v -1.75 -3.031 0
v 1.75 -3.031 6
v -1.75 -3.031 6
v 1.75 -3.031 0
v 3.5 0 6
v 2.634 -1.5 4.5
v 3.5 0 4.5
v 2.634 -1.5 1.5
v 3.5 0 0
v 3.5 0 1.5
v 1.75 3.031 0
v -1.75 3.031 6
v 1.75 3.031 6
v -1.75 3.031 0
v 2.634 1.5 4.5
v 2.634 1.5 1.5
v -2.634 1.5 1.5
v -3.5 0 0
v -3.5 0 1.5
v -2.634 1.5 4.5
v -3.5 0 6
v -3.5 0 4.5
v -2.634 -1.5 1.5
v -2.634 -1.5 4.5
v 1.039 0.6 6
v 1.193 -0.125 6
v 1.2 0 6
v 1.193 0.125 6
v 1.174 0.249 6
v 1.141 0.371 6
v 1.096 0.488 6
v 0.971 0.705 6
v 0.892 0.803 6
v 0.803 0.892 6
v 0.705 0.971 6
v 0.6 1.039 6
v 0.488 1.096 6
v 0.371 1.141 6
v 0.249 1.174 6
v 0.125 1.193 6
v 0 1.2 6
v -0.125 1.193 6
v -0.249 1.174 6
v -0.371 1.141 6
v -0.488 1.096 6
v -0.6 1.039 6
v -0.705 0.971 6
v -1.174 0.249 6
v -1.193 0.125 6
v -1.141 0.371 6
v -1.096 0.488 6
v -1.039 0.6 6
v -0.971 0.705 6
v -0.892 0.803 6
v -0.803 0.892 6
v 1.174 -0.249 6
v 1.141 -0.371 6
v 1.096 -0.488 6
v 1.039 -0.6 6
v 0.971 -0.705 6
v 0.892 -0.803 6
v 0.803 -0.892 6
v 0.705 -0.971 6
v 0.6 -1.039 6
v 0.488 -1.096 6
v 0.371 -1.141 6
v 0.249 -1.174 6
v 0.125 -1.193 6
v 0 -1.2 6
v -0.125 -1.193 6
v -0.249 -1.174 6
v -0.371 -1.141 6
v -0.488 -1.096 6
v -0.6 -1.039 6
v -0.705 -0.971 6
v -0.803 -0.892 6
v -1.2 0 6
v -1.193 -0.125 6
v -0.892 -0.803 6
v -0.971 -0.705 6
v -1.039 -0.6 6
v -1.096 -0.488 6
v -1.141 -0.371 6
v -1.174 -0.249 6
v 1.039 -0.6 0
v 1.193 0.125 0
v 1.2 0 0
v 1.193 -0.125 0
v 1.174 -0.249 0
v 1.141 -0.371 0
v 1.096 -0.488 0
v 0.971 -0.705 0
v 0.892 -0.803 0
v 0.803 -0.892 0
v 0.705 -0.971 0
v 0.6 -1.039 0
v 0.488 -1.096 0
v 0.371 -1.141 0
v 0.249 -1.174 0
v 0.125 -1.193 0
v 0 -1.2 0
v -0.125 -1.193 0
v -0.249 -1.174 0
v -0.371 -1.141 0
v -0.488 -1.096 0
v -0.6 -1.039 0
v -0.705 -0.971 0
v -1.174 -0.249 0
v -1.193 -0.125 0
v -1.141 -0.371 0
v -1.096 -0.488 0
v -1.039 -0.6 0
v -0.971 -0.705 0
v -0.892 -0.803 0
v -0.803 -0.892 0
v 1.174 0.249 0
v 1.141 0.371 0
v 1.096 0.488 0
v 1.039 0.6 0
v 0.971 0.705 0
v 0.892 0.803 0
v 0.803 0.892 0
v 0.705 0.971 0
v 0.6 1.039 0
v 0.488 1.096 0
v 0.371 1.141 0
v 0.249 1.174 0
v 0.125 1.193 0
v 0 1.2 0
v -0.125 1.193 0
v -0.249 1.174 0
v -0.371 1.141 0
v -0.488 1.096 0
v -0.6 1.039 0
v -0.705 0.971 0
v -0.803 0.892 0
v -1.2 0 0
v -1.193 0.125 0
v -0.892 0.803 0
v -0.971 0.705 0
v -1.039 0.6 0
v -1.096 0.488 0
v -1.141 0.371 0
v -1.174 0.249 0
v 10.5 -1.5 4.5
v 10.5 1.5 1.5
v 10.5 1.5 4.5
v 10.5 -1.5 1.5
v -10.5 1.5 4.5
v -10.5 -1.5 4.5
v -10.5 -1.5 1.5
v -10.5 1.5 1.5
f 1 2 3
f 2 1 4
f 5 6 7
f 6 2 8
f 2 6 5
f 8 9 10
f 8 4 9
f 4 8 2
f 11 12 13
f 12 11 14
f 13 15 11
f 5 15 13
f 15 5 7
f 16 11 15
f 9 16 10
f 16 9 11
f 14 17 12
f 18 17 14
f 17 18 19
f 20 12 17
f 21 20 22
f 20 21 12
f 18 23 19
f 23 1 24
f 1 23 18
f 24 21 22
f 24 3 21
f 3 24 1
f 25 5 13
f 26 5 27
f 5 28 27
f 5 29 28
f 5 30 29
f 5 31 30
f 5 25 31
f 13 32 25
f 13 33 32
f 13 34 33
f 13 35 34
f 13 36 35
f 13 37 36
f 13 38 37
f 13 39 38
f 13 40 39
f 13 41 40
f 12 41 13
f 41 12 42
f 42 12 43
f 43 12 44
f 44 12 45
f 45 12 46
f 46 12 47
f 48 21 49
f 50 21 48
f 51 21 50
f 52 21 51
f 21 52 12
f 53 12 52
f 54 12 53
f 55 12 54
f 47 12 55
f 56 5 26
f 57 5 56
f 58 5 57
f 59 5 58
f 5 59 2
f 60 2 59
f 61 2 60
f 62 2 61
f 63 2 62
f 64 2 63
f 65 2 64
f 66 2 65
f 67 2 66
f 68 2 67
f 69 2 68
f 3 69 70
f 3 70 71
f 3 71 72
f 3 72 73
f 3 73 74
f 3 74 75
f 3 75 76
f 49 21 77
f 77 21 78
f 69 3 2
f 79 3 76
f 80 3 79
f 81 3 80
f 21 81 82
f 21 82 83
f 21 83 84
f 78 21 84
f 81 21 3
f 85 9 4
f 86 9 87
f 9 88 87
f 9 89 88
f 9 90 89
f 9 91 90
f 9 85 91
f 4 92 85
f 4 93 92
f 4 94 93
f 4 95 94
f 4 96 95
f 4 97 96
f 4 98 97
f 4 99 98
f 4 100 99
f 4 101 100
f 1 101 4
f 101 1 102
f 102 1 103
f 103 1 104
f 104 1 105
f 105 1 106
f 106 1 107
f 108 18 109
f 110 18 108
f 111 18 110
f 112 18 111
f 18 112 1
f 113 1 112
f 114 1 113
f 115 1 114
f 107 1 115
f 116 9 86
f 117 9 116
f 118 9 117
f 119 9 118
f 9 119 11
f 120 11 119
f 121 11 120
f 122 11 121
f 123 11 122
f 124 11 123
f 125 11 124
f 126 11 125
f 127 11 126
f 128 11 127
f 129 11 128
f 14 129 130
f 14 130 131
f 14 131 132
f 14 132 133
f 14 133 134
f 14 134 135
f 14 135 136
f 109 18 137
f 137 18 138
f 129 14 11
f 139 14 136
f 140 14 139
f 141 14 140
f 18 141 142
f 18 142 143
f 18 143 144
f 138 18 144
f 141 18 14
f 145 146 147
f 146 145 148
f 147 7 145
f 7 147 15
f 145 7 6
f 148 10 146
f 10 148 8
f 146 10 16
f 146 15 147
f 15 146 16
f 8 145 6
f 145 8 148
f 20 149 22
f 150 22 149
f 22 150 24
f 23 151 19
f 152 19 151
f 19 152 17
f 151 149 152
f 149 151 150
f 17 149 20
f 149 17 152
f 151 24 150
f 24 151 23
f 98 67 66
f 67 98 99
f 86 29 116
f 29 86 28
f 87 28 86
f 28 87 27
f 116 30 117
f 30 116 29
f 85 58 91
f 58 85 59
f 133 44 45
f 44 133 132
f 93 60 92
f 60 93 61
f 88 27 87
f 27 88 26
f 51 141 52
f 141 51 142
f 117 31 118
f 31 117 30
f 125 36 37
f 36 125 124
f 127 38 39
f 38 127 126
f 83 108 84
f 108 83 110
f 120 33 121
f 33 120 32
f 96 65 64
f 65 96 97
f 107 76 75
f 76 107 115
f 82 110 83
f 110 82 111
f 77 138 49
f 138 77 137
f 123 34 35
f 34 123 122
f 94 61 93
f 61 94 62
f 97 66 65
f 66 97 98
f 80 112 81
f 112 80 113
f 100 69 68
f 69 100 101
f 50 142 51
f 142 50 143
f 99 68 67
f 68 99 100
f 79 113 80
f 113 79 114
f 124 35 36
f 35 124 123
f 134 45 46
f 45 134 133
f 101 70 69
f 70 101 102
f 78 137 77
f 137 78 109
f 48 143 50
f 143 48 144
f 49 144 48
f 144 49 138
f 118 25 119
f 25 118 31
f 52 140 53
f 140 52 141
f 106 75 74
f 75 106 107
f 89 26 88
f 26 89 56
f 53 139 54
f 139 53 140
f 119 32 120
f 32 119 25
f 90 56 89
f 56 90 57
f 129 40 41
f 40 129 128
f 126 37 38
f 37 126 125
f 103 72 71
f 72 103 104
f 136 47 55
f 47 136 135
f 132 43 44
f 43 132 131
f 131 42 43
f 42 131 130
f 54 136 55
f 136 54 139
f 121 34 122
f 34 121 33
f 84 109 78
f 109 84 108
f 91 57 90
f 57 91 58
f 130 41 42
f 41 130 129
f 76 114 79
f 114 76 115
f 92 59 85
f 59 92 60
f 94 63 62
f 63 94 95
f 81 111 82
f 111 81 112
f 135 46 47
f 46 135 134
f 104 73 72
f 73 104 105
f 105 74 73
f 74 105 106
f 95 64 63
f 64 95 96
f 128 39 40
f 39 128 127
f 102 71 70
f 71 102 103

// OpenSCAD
// Wing nut with two reinforced wings.
$fn = 60;
eps = 0.02;
thread_d = 2.4;
body_d = 7;
body_h = 6;
wing_l = 8;
wing_t = 3;
difference() {
    union() {
        cylinder(d = body_d, h = body_h, $fn = 6);
        translate([body_d / 2 - 1, -wing_t / 2, body_h / 2 - wing_t / 2]) cube([wing_l, wing_t, wing_t]);
        translate([-body_d / 2 - wing_l + 1, -wing_t / 2, body_h / 2 - wing_t / 2]) cube([wing_l, wing_t, wing_t]);
    }
    translate([0, 0, -eps]) cylinder(d = thread_d, h = body_h + 2 * eps);
}
